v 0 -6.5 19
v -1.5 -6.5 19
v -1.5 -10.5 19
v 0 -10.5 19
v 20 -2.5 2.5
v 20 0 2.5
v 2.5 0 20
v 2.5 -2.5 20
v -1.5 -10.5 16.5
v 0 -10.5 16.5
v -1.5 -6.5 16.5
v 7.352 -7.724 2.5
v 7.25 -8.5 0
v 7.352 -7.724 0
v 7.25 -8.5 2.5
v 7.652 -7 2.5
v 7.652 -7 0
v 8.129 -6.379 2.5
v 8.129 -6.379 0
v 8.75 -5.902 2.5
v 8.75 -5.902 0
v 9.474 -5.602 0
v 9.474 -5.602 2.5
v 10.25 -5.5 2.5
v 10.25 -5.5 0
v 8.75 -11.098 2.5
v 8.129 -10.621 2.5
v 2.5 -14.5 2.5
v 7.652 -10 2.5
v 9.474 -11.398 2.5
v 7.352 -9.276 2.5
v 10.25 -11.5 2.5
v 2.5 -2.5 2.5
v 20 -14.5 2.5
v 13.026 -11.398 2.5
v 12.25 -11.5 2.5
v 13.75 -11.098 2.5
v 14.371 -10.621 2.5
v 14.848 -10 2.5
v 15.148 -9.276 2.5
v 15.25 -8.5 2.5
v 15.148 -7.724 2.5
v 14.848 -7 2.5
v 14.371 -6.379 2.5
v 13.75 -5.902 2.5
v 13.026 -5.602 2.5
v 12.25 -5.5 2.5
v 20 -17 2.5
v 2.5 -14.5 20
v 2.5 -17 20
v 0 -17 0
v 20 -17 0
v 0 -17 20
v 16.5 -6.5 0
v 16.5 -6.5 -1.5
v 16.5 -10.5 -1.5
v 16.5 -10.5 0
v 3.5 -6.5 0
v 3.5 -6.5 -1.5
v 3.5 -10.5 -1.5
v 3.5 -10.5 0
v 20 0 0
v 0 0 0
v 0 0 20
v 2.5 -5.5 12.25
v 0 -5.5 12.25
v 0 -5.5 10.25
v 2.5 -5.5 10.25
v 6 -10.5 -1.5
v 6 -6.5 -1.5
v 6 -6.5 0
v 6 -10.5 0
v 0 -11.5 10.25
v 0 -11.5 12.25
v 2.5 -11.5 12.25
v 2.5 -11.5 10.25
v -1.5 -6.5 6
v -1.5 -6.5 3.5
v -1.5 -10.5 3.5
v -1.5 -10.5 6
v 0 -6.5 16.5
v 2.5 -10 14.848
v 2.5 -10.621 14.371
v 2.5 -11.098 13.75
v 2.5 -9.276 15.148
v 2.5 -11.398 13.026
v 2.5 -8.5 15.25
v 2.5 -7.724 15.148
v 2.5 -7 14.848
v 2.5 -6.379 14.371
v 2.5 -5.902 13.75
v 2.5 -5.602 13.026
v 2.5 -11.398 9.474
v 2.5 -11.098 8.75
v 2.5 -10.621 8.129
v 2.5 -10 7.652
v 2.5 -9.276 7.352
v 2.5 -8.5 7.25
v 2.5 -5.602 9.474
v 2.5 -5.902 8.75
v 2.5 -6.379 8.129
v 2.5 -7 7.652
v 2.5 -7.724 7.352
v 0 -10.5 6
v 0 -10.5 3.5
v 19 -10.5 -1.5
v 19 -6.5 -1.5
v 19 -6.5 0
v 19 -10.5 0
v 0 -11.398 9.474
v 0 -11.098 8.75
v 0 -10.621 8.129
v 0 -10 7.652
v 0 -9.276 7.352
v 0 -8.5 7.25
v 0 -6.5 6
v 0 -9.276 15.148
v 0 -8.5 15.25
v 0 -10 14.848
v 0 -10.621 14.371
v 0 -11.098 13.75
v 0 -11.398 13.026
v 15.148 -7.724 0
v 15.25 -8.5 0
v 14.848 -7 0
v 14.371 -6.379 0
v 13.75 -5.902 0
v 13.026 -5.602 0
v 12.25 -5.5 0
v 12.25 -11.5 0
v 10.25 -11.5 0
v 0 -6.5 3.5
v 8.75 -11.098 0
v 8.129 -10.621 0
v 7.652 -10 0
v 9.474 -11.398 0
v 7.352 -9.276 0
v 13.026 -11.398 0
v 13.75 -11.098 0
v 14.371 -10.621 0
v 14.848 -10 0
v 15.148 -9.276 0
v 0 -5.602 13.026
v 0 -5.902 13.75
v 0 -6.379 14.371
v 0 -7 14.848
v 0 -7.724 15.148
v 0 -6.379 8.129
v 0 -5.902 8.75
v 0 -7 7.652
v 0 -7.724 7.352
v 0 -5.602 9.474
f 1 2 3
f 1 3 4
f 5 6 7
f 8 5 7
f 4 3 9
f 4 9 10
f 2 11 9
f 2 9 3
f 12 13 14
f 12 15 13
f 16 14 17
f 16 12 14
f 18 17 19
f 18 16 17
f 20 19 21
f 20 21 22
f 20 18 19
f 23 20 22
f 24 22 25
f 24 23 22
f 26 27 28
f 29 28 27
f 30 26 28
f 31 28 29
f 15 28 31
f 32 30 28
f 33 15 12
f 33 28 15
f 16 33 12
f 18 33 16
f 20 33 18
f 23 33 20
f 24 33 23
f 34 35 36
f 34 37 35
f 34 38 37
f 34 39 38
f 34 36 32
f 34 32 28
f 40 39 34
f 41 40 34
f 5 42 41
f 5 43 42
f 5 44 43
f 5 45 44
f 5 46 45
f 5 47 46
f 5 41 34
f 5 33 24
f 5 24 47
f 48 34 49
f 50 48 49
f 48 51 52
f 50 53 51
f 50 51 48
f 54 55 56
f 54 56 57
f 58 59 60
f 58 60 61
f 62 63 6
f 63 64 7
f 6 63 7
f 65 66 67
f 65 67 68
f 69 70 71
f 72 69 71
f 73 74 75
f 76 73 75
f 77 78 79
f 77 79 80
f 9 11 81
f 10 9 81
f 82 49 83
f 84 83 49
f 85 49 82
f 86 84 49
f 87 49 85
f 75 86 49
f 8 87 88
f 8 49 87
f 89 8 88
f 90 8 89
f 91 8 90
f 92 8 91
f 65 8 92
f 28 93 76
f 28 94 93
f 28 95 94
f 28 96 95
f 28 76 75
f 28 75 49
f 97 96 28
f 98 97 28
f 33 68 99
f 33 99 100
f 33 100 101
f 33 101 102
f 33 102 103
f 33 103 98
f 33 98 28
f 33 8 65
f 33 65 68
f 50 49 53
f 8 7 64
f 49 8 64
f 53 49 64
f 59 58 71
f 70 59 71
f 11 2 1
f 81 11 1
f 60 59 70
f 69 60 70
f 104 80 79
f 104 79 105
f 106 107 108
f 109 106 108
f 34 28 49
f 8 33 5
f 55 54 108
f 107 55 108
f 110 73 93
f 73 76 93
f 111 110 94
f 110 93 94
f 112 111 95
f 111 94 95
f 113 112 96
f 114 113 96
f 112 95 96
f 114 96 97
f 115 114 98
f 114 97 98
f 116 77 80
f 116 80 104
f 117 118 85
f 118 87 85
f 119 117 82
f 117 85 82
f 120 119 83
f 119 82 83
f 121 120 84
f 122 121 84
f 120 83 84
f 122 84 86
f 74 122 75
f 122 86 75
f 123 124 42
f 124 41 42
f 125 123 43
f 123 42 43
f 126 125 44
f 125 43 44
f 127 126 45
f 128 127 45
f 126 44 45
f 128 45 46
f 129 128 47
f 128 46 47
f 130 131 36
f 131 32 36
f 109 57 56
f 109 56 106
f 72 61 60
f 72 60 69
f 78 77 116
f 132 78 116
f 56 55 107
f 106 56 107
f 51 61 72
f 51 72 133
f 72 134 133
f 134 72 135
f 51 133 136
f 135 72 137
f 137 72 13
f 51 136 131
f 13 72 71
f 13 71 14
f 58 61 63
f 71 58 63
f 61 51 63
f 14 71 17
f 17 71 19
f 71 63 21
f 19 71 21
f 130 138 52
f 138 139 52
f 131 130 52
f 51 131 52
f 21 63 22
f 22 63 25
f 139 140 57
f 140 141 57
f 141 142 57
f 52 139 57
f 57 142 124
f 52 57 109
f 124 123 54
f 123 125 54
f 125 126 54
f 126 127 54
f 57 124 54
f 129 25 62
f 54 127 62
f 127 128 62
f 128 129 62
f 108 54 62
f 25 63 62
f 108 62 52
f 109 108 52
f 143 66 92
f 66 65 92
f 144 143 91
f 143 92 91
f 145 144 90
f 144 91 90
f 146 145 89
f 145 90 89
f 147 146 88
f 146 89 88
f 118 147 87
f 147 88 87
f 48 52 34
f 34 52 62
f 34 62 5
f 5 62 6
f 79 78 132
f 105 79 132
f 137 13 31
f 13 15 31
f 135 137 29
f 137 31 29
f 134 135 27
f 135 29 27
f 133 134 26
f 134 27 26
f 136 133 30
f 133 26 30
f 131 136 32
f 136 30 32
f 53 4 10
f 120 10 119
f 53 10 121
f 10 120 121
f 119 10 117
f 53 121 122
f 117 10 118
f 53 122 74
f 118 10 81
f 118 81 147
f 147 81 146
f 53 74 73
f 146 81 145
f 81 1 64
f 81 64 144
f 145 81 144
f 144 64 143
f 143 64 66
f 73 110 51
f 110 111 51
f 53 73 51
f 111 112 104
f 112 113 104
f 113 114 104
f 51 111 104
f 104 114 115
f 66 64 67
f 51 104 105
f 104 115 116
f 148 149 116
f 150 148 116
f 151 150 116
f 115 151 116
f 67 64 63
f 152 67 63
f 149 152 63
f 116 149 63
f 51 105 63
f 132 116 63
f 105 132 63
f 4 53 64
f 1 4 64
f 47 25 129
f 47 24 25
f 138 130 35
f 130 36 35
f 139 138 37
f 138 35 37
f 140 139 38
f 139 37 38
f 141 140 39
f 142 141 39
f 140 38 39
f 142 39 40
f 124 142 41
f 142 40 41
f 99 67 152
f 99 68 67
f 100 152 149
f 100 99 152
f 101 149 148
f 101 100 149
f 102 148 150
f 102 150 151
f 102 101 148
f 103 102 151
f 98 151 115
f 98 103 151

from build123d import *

# Parameters (mm, degrees)
F0_W     = 2.5
F0_H     = 8
F0_W_2   = 8
F0_H_2   = 2.5
F1_DEPTH = 17
F2_START = 2.5
F2_DEPTH = 12
F3_START = 5.5
F3_DEPTH = 6
F4_R     = 2.99999
F5_START = 6.5
F0_W_3   = 1.5
F0_H_3   = 1.5
F5_DEPTH = 4


# Not quite as in the source:
# - a fillet or chamfer is up to 0.001 mm smaller than in the source, because OpenCascade refuses the exact size


with BuildPart() as f1:
    # F0 (on Front) → F1 (new body)
    with BuildSketch(Plane.XZ):
        Polygon((20, 2.5), (2.5, 20), (2.5, 15.25), (2.5, 7.25), (2.5, 2.5), (7.25, 2.5), (15.25, 2.5), align=None)
        Polygon((20, 0), (20, 2.5), (15.25, 2.5), (15.25, 0), (16.5, 0), (19, 0), align=None)
        Polygon((2.5, 20), (0, 20), (0, 19), (0, 16.5), (0, 15.25), (2.5, 15.25), align=None)
        Polygon((2.5, 2.5), (2.5, 7.25), (0, 7.25), (0, 6), (0, 3.5), (0, 0), (3.5, 0), (6, 0), (7.25, 0), (7.25, 2.5), align=None)
        with Locations((1.25, 11.25)):
            Rectangle(F0_W, F0_H)
        with Locations((11.25, 1.25)):
            Rectangle(F0_W_2, F0_H_2)
    extrude(amount=F1_DEPTH)

    # F0 (on Front) → F2 (cut)
    with BuildSketch(Plane.XZ.offset(F2_START)):
        Polygon((20, 2.5), (2.5, 20), (2.5, 15.25), (2.5, 7.25), (2.5, 2.5), (7.25, 2.5), (15.25, 2.5), align=None)
    extrude(amount=F2_DEPTH, mode=Mode.SUBTRACT)

    # F0 (on Front) → F3 (cut)
    with BuildSketch(Plane.XZ.offset(F3_START)):
        with Locations((1.25, 11.25)):
            Rectangle(F0_W, F0_H)
        with Locations((11.25, 1.25)):
            Rectangle(F0_W_2, F0_H_2)
    extrude(amount=F3_DEPTH, mode=Mode.SUBTRACT)

    # F4 (radius 3 in the source; OpenCascade refuses exactly that, so slightly less here)
    f4_edges = [f1.edges().sort_by_distance(p)[0] for p in [
        (1.25, -11.5, 7.25),
        (1.25, -5.5, 7.25),
        (1.25, -11.5, 15.25),
        (1.25, -5.5, 15.25),
        (7.25, -11.5, 1.25),
        (7.25, -5.5, 1.25),
        (15.25, -11.5, 1.25),
        (15.25, -5.5, 1.25),
    ]]
    fillet(f4_edges, radius=F4_R)

    # F0 (on Front) → F5 (join)
    with BuildSketch(Plane.XZ.offset(F5_START)):
        with Locations((-0.75, 17.75)):
            Rectangle(F0_W_3, F0_H_2)
        with Locations((-0.75, 4.75)):
            Rectangle(F0_W_3, F0_H_2)
        with Locations((4.75, -0.75)):
            Rectangle(F0_W, F0_H_3)
        with Locations((17.75, -0.75)):
            Rectangle(F0_W, F0_H_3)
    extrude(amount=F5_DEPTH)


solid = f1.part
